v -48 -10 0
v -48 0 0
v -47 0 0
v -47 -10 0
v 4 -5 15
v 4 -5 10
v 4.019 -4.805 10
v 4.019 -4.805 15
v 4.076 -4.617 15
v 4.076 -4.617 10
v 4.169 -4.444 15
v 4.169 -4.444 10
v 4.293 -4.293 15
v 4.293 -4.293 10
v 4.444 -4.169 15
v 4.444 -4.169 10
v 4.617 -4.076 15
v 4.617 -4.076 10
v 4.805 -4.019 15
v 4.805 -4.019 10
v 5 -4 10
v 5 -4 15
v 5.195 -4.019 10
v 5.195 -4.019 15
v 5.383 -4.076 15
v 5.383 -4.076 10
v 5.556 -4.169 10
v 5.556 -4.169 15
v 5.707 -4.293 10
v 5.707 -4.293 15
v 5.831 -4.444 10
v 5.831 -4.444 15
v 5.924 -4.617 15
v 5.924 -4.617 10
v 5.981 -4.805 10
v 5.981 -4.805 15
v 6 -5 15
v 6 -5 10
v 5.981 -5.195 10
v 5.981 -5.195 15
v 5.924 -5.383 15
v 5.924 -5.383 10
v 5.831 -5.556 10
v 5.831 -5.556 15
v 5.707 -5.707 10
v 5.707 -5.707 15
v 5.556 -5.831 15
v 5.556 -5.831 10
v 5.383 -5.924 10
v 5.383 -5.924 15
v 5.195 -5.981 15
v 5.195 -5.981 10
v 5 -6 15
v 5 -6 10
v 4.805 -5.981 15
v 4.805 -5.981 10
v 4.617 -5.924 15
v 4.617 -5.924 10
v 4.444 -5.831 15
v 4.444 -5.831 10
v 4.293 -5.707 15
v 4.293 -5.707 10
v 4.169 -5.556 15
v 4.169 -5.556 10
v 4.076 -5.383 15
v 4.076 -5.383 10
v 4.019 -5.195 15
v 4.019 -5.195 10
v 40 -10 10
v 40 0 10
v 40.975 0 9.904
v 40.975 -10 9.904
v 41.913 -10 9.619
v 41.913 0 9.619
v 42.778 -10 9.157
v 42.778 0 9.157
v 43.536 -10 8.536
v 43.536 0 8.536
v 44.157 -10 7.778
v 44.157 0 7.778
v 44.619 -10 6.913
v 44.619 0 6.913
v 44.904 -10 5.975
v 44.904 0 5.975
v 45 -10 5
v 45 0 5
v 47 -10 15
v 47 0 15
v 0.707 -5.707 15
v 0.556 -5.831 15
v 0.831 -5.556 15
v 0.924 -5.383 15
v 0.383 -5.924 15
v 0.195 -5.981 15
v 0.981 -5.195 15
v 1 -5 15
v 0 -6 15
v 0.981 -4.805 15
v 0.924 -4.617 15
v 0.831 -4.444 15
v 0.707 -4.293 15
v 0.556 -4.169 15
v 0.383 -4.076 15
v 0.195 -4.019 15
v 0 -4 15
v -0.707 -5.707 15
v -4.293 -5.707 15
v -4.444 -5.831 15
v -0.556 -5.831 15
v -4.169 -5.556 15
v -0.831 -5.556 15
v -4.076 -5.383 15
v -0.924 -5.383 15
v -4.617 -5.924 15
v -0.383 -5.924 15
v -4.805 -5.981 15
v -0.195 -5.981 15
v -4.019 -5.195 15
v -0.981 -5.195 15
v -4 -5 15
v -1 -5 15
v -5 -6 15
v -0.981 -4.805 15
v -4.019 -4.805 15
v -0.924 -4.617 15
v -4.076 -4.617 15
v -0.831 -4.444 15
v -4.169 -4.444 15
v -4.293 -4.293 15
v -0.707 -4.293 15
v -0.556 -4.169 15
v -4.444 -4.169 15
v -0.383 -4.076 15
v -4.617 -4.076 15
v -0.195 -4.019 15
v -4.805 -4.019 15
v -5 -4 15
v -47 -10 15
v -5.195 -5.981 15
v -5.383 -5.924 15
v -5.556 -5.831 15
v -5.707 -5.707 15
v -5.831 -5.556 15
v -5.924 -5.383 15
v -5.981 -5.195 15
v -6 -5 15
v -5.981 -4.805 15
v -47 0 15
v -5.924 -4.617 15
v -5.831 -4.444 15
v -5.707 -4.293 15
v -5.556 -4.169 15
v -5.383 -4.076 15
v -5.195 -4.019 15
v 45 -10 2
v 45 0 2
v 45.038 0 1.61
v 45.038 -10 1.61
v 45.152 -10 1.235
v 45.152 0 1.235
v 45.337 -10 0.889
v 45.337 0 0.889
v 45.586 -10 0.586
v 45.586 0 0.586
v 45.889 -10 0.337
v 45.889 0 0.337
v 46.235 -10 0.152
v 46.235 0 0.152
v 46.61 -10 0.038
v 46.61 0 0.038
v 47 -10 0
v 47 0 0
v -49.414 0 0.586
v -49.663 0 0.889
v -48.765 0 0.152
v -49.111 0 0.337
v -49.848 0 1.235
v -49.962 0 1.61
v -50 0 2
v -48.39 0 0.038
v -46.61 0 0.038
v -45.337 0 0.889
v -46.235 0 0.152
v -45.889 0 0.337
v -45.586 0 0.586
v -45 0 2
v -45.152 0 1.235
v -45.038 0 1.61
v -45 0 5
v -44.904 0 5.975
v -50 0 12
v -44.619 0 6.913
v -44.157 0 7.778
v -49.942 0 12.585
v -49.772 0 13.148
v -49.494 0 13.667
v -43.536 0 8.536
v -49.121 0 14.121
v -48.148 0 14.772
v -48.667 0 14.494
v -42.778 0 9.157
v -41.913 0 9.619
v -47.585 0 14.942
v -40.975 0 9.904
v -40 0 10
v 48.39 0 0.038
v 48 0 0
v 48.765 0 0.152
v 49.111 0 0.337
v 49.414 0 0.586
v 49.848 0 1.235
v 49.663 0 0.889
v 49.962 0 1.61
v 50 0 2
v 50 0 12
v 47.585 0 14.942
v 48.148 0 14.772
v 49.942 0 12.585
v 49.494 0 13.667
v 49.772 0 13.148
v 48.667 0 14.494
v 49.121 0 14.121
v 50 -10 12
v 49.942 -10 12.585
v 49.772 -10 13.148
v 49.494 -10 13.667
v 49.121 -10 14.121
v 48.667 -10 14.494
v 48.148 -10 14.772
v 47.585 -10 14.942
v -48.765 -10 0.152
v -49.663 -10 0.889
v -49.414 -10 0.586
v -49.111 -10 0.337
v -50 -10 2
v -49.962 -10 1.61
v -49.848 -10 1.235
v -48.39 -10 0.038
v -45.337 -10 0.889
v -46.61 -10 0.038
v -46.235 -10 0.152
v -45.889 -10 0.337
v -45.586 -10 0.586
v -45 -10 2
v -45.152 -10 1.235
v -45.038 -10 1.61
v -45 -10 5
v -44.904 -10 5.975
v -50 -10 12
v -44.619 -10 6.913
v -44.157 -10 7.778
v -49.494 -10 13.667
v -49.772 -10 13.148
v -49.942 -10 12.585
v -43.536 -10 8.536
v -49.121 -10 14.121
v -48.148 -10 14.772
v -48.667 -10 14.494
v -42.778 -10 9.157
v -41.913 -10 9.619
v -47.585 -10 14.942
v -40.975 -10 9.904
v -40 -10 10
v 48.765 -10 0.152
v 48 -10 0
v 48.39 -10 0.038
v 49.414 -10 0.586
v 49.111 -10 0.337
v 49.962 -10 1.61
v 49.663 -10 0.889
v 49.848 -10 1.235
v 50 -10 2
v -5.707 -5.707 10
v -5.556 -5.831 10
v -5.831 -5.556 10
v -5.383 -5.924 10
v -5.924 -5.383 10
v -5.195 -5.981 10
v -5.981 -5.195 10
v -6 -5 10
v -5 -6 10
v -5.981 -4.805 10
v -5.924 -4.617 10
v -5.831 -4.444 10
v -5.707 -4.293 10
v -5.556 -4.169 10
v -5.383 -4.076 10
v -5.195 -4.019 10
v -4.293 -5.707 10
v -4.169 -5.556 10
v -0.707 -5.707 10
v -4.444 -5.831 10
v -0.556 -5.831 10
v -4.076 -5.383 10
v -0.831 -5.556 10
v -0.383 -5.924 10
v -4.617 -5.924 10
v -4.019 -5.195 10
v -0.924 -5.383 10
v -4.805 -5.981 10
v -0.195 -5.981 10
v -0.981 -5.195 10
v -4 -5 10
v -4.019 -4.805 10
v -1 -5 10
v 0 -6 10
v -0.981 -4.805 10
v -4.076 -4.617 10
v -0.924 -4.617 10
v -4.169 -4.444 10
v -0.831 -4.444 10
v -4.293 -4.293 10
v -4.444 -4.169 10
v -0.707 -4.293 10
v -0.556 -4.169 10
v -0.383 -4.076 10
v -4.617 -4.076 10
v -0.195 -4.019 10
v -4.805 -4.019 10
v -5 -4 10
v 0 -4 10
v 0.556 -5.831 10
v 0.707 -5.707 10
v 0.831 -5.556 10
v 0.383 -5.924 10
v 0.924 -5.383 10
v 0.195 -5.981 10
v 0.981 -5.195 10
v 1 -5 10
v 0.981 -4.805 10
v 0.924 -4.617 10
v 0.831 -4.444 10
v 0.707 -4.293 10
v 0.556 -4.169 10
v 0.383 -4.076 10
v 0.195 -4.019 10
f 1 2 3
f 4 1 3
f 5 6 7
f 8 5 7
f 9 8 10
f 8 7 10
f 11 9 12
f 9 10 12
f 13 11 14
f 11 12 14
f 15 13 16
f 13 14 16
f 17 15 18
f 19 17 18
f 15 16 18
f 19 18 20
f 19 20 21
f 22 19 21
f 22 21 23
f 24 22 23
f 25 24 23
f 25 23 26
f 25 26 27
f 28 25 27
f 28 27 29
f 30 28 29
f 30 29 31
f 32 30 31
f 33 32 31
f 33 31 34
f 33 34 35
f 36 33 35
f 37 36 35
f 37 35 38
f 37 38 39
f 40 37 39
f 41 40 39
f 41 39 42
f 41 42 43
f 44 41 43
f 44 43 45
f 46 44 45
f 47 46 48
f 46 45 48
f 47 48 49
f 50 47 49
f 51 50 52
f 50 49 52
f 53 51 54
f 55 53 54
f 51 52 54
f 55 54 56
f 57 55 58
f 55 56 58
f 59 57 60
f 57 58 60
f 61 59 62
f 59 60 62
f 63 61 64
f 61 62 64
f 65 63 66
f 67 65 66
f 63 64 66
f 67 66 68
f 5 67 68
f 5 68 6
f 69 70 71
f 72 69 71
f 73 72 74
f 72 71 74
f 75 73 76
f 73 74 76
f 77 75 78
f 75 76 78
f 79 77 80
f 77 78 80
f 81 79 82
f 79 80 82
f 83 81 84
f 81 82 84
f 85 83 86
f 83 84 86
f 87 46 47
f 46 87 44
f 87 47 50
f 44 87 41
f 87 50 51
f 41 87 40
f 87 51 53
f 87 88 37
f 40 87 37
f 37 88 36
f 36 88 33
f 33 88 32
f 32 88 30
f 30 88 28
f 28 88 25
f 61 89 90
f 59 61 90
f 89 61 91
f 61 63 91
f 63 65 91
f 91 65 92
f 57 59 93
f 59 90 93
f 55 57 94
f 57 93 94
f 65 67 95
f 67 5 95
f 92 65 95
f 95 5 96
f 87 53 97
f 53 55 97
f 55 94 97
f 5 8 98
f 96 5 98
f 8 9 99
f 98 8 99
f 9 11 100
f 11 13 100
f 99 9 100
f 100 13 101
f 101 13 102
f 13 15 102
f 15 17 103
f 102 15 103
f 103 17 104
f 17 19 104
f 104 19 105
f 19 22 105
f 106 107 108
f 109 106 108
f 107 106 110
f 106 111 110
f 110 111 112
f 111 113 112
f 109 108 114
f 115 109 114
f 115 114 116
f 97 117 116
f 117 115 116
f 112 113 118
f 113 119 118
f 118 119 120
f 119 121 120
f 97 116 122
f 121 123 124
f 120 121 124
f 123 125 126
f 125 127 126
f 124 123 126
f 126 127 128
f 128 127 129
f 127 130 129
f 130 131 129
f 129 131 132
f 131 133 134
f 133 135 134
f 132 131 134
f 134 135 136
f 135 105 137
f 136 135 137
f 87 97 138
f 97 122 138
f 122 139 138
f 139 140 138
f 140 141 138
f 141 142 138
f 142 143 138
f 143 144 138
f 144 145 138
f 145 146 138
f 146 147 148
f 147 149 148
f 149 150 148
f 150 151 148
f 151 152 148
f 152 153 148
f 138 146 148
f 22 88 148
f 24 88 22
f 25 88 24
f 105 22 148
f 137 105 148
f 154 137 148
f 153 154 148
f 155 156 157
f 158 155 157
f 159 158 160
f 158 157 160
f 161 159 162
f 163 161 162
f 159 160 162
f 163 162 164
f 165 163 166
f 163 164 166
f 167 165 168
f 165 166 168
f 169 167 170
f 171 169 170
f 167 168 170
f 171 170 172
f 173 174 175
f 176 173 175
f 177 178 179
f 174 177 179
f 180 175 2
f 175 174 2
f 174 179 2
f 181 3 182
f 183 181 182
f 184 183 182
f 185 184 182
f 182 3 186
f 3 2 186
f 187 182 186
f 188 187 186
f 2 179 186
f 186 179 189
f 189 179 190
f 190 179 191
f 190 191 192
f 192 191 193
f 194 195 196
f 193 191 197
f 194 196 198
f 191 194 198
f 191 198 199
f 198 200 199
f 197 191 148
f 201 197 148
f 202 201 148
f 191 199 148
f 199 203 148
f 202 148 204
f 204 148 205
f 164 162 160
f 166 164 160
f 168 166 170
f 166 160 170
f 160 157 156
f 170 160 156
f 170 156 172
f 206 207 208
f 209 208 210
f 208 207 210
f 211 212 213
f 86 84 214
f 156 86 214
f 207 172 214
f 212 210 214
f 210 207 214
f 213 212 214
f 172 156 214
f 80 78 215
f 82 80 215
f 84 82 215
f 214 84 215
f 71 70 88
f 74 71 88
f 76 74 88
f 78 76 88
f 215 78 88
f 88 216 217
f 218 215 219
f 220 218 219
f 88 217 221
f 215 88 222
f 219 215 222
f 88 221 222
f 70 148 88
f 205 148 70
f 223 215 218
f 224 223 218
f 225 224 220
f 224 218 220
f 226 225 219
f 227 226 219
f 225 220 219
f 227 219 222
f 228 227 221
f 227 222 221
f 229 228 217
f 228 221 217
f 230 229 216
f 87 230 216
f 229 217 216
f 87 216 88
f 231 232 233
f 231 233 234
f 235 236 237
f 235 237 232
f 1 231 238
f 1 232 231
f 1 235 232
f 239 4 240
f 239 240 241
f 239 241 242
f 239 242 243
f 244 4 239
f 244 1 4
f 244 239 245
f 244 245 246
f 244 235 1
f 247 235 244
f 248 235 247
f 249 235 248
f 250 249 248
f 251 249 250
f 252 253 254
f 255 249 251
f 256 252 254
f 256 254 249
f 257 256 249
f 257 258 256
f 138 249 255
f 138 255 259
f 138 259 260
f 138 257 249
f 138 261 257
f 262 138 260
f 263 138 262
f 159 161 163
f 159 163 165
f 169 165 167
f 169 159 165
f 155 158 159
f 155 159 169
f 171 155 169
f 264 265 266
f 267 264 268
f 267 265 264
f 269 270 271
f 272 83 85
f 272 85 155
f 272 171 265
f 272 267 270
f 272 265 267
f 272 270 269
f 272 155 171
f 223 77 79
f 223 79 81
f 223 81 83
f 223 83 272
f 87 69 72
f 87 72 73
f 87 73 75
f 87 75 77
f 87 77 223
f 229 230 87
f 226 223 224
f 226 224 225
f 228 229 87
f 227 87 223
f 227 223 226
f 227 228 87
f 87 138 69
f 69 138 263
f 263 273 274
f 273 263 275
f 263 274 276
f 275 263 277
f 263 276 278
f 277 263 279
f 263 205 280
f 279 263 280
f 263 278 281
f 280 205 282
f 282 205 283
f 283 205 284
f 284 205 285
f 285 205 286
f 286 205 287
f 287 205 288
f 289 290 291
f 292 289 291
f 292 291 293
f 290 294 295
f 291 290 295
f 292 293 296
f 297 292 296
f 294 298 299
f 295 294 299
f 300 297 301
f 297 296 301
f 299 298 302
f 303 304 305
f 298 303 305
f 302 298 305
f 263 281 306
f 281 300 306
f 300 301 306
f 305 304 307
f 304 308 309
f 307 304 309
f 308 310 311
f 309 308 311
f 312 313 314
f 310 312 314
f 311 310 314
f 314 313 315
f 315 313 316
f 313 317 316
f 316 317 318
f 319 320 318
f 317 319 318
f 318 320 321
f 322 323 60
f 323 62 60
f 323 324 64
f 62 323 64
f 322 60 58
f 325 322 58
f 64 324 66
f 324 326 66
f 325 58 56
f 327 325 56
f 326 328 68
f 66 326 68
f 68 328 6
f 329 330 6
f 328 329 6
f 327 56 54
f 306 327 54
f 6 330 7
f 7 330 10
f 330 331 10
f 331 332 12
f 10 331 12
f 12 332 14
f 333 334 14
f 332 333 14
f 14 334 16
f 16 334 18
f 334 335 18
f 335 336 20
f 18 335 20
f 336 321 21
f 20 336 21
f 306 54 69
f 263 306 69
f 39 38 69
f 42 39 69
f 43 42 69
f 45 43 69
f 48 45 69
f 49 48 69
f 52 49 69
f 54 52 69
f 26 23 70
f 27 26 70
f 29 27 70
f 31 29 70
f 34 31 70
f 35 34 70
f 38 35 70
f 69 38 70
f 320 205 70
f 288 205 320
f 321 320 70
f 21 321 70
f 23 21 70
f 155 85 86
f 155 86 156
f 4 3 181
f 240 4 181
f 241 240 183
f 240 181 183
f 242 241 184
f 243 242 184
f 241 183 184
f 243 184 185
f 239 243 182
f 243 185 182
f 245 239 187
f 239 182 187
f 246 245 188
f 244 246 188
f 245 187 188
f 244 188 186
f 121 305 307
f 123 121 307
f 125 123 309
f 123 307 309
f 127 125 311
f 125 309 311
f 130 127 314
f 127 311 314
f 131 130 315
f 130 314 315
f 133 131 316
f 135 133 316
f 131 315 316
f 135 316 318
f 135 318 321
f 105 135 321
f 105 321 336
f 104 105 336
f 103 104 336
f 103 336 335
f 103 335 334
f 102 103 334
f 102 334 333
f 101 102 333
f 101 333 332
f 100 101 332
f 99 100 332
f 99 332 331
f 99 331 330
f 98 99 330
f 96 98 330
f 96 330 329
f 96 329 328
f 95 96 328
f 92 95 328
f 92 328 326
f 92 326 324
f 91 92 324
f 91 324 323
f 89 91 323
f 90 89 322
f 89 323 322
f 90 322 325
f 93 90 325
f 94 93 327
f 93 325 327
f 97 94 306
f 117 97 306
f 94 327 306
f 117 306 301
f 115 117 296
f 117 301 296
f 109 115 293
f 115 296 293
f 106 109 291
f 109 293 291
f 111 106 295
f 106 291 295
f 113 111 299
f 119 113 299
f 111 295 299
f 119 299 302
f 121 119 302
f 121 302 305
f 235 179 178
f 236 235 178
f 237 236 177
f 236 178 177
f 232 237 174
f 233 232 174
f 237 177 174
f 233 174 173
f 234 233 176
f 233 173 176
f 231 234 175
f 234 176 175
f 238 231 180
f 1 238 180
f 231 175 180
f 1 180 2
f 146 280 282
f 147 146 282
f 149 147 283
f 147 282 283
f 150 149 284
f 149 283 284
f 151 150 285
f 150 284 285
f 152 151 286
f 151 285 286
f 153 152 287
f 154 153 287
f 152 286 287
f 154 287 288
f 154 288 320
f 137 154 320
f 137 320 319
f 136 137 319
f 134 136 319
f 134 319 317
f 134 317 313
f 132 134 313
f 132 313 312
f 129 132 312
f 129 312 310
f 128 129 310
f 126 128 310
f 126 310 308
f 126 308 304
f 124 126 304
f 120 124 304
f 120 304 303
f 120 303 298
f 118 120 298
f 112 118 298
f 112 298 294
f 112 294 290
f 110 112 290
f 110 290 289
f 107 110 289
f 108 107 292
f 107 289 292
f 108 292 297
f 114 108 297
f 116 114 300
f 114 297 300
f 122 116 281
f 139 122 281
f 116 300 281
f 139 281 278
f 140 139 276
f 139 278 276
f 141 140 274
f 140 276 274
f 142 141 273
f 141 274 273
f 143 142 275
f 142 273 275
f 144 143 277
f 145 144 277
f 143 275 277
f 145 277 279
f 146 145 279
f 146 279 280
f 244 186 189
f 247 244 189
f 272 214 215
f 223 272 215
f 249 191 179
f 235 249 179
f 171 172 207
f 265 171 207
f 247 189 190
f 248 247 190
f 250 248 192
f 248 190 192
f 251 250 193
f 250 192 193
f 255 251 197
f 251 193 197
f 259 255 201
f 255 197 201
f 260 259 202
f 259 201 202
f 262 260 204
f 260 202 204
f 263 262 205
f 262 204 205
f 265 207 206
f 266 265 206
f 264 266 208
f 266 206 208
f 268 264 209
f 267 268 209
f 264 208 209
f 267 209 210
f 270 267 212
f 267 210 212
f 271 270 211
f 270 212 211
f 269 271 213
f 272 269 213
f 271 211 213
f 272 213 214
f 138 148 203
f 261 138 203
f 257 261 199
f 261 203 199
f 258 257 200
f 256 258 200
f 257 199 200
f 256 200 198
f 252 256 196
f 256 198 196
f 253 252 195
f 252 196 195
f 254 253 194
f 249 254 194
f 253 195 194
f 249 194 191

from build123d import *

# Parameters (mm, degrees)
F1_DEPTH = 10
F3_D     = 2


with BuildPart() as f1:
    # F0 (on Front) → F1 (new body)
    with BuildSketch(Plane.XZ):
        with BuildLine():
            ThreePointArc((-50, 2), (-49.414214, 0.585786), (-48, 0))
            Line((-48, 0), (-47, 0))
            ThreePointArc((-47, 0), (-45.585786, 0.585786), (-45, 2))
            Line((-45, 2), (-45, 5))
            ThreePointArc((-45, 5), (-43.535534, 8.535534), (-40, 10))
            Line((-40, 10), (0, 10))
            Line((0, 10), (40, 10))
            ThreePointArc((40, 10), (43.535534, 8.535534), (45, 5))
            Line((45, 5), (45, 2))
            ThreePointArc((45, 2), (45.585786, 0.585786), (47, 0))
            Line((47, 0), (48, 0))
            ThreePointArc((48, 0), (49.414214, 0.585786), (50, 2))
            Line((50, 2), (50, 12))
            ThreePointArc((50, 12), (49.12132, 14.12132), (47, 15))
            Line((47, 15), (0, 15))
            Line((0, 15), (-47, 15))
            ThreePointArc((-47, 15), (-49.12132, 14.12132), (-50, 12))
            Line((-50, 12), (-50, 2))
        make_face()
    extrude(amount=F1_DEPTH)

    # F3 (through all)
    with Locations(Plane.XY.offset(15)):
        with Locations((-5, -5), (5, -5), (0, -5)):
            Hole(F3_D / 2)


solid = f1.part
